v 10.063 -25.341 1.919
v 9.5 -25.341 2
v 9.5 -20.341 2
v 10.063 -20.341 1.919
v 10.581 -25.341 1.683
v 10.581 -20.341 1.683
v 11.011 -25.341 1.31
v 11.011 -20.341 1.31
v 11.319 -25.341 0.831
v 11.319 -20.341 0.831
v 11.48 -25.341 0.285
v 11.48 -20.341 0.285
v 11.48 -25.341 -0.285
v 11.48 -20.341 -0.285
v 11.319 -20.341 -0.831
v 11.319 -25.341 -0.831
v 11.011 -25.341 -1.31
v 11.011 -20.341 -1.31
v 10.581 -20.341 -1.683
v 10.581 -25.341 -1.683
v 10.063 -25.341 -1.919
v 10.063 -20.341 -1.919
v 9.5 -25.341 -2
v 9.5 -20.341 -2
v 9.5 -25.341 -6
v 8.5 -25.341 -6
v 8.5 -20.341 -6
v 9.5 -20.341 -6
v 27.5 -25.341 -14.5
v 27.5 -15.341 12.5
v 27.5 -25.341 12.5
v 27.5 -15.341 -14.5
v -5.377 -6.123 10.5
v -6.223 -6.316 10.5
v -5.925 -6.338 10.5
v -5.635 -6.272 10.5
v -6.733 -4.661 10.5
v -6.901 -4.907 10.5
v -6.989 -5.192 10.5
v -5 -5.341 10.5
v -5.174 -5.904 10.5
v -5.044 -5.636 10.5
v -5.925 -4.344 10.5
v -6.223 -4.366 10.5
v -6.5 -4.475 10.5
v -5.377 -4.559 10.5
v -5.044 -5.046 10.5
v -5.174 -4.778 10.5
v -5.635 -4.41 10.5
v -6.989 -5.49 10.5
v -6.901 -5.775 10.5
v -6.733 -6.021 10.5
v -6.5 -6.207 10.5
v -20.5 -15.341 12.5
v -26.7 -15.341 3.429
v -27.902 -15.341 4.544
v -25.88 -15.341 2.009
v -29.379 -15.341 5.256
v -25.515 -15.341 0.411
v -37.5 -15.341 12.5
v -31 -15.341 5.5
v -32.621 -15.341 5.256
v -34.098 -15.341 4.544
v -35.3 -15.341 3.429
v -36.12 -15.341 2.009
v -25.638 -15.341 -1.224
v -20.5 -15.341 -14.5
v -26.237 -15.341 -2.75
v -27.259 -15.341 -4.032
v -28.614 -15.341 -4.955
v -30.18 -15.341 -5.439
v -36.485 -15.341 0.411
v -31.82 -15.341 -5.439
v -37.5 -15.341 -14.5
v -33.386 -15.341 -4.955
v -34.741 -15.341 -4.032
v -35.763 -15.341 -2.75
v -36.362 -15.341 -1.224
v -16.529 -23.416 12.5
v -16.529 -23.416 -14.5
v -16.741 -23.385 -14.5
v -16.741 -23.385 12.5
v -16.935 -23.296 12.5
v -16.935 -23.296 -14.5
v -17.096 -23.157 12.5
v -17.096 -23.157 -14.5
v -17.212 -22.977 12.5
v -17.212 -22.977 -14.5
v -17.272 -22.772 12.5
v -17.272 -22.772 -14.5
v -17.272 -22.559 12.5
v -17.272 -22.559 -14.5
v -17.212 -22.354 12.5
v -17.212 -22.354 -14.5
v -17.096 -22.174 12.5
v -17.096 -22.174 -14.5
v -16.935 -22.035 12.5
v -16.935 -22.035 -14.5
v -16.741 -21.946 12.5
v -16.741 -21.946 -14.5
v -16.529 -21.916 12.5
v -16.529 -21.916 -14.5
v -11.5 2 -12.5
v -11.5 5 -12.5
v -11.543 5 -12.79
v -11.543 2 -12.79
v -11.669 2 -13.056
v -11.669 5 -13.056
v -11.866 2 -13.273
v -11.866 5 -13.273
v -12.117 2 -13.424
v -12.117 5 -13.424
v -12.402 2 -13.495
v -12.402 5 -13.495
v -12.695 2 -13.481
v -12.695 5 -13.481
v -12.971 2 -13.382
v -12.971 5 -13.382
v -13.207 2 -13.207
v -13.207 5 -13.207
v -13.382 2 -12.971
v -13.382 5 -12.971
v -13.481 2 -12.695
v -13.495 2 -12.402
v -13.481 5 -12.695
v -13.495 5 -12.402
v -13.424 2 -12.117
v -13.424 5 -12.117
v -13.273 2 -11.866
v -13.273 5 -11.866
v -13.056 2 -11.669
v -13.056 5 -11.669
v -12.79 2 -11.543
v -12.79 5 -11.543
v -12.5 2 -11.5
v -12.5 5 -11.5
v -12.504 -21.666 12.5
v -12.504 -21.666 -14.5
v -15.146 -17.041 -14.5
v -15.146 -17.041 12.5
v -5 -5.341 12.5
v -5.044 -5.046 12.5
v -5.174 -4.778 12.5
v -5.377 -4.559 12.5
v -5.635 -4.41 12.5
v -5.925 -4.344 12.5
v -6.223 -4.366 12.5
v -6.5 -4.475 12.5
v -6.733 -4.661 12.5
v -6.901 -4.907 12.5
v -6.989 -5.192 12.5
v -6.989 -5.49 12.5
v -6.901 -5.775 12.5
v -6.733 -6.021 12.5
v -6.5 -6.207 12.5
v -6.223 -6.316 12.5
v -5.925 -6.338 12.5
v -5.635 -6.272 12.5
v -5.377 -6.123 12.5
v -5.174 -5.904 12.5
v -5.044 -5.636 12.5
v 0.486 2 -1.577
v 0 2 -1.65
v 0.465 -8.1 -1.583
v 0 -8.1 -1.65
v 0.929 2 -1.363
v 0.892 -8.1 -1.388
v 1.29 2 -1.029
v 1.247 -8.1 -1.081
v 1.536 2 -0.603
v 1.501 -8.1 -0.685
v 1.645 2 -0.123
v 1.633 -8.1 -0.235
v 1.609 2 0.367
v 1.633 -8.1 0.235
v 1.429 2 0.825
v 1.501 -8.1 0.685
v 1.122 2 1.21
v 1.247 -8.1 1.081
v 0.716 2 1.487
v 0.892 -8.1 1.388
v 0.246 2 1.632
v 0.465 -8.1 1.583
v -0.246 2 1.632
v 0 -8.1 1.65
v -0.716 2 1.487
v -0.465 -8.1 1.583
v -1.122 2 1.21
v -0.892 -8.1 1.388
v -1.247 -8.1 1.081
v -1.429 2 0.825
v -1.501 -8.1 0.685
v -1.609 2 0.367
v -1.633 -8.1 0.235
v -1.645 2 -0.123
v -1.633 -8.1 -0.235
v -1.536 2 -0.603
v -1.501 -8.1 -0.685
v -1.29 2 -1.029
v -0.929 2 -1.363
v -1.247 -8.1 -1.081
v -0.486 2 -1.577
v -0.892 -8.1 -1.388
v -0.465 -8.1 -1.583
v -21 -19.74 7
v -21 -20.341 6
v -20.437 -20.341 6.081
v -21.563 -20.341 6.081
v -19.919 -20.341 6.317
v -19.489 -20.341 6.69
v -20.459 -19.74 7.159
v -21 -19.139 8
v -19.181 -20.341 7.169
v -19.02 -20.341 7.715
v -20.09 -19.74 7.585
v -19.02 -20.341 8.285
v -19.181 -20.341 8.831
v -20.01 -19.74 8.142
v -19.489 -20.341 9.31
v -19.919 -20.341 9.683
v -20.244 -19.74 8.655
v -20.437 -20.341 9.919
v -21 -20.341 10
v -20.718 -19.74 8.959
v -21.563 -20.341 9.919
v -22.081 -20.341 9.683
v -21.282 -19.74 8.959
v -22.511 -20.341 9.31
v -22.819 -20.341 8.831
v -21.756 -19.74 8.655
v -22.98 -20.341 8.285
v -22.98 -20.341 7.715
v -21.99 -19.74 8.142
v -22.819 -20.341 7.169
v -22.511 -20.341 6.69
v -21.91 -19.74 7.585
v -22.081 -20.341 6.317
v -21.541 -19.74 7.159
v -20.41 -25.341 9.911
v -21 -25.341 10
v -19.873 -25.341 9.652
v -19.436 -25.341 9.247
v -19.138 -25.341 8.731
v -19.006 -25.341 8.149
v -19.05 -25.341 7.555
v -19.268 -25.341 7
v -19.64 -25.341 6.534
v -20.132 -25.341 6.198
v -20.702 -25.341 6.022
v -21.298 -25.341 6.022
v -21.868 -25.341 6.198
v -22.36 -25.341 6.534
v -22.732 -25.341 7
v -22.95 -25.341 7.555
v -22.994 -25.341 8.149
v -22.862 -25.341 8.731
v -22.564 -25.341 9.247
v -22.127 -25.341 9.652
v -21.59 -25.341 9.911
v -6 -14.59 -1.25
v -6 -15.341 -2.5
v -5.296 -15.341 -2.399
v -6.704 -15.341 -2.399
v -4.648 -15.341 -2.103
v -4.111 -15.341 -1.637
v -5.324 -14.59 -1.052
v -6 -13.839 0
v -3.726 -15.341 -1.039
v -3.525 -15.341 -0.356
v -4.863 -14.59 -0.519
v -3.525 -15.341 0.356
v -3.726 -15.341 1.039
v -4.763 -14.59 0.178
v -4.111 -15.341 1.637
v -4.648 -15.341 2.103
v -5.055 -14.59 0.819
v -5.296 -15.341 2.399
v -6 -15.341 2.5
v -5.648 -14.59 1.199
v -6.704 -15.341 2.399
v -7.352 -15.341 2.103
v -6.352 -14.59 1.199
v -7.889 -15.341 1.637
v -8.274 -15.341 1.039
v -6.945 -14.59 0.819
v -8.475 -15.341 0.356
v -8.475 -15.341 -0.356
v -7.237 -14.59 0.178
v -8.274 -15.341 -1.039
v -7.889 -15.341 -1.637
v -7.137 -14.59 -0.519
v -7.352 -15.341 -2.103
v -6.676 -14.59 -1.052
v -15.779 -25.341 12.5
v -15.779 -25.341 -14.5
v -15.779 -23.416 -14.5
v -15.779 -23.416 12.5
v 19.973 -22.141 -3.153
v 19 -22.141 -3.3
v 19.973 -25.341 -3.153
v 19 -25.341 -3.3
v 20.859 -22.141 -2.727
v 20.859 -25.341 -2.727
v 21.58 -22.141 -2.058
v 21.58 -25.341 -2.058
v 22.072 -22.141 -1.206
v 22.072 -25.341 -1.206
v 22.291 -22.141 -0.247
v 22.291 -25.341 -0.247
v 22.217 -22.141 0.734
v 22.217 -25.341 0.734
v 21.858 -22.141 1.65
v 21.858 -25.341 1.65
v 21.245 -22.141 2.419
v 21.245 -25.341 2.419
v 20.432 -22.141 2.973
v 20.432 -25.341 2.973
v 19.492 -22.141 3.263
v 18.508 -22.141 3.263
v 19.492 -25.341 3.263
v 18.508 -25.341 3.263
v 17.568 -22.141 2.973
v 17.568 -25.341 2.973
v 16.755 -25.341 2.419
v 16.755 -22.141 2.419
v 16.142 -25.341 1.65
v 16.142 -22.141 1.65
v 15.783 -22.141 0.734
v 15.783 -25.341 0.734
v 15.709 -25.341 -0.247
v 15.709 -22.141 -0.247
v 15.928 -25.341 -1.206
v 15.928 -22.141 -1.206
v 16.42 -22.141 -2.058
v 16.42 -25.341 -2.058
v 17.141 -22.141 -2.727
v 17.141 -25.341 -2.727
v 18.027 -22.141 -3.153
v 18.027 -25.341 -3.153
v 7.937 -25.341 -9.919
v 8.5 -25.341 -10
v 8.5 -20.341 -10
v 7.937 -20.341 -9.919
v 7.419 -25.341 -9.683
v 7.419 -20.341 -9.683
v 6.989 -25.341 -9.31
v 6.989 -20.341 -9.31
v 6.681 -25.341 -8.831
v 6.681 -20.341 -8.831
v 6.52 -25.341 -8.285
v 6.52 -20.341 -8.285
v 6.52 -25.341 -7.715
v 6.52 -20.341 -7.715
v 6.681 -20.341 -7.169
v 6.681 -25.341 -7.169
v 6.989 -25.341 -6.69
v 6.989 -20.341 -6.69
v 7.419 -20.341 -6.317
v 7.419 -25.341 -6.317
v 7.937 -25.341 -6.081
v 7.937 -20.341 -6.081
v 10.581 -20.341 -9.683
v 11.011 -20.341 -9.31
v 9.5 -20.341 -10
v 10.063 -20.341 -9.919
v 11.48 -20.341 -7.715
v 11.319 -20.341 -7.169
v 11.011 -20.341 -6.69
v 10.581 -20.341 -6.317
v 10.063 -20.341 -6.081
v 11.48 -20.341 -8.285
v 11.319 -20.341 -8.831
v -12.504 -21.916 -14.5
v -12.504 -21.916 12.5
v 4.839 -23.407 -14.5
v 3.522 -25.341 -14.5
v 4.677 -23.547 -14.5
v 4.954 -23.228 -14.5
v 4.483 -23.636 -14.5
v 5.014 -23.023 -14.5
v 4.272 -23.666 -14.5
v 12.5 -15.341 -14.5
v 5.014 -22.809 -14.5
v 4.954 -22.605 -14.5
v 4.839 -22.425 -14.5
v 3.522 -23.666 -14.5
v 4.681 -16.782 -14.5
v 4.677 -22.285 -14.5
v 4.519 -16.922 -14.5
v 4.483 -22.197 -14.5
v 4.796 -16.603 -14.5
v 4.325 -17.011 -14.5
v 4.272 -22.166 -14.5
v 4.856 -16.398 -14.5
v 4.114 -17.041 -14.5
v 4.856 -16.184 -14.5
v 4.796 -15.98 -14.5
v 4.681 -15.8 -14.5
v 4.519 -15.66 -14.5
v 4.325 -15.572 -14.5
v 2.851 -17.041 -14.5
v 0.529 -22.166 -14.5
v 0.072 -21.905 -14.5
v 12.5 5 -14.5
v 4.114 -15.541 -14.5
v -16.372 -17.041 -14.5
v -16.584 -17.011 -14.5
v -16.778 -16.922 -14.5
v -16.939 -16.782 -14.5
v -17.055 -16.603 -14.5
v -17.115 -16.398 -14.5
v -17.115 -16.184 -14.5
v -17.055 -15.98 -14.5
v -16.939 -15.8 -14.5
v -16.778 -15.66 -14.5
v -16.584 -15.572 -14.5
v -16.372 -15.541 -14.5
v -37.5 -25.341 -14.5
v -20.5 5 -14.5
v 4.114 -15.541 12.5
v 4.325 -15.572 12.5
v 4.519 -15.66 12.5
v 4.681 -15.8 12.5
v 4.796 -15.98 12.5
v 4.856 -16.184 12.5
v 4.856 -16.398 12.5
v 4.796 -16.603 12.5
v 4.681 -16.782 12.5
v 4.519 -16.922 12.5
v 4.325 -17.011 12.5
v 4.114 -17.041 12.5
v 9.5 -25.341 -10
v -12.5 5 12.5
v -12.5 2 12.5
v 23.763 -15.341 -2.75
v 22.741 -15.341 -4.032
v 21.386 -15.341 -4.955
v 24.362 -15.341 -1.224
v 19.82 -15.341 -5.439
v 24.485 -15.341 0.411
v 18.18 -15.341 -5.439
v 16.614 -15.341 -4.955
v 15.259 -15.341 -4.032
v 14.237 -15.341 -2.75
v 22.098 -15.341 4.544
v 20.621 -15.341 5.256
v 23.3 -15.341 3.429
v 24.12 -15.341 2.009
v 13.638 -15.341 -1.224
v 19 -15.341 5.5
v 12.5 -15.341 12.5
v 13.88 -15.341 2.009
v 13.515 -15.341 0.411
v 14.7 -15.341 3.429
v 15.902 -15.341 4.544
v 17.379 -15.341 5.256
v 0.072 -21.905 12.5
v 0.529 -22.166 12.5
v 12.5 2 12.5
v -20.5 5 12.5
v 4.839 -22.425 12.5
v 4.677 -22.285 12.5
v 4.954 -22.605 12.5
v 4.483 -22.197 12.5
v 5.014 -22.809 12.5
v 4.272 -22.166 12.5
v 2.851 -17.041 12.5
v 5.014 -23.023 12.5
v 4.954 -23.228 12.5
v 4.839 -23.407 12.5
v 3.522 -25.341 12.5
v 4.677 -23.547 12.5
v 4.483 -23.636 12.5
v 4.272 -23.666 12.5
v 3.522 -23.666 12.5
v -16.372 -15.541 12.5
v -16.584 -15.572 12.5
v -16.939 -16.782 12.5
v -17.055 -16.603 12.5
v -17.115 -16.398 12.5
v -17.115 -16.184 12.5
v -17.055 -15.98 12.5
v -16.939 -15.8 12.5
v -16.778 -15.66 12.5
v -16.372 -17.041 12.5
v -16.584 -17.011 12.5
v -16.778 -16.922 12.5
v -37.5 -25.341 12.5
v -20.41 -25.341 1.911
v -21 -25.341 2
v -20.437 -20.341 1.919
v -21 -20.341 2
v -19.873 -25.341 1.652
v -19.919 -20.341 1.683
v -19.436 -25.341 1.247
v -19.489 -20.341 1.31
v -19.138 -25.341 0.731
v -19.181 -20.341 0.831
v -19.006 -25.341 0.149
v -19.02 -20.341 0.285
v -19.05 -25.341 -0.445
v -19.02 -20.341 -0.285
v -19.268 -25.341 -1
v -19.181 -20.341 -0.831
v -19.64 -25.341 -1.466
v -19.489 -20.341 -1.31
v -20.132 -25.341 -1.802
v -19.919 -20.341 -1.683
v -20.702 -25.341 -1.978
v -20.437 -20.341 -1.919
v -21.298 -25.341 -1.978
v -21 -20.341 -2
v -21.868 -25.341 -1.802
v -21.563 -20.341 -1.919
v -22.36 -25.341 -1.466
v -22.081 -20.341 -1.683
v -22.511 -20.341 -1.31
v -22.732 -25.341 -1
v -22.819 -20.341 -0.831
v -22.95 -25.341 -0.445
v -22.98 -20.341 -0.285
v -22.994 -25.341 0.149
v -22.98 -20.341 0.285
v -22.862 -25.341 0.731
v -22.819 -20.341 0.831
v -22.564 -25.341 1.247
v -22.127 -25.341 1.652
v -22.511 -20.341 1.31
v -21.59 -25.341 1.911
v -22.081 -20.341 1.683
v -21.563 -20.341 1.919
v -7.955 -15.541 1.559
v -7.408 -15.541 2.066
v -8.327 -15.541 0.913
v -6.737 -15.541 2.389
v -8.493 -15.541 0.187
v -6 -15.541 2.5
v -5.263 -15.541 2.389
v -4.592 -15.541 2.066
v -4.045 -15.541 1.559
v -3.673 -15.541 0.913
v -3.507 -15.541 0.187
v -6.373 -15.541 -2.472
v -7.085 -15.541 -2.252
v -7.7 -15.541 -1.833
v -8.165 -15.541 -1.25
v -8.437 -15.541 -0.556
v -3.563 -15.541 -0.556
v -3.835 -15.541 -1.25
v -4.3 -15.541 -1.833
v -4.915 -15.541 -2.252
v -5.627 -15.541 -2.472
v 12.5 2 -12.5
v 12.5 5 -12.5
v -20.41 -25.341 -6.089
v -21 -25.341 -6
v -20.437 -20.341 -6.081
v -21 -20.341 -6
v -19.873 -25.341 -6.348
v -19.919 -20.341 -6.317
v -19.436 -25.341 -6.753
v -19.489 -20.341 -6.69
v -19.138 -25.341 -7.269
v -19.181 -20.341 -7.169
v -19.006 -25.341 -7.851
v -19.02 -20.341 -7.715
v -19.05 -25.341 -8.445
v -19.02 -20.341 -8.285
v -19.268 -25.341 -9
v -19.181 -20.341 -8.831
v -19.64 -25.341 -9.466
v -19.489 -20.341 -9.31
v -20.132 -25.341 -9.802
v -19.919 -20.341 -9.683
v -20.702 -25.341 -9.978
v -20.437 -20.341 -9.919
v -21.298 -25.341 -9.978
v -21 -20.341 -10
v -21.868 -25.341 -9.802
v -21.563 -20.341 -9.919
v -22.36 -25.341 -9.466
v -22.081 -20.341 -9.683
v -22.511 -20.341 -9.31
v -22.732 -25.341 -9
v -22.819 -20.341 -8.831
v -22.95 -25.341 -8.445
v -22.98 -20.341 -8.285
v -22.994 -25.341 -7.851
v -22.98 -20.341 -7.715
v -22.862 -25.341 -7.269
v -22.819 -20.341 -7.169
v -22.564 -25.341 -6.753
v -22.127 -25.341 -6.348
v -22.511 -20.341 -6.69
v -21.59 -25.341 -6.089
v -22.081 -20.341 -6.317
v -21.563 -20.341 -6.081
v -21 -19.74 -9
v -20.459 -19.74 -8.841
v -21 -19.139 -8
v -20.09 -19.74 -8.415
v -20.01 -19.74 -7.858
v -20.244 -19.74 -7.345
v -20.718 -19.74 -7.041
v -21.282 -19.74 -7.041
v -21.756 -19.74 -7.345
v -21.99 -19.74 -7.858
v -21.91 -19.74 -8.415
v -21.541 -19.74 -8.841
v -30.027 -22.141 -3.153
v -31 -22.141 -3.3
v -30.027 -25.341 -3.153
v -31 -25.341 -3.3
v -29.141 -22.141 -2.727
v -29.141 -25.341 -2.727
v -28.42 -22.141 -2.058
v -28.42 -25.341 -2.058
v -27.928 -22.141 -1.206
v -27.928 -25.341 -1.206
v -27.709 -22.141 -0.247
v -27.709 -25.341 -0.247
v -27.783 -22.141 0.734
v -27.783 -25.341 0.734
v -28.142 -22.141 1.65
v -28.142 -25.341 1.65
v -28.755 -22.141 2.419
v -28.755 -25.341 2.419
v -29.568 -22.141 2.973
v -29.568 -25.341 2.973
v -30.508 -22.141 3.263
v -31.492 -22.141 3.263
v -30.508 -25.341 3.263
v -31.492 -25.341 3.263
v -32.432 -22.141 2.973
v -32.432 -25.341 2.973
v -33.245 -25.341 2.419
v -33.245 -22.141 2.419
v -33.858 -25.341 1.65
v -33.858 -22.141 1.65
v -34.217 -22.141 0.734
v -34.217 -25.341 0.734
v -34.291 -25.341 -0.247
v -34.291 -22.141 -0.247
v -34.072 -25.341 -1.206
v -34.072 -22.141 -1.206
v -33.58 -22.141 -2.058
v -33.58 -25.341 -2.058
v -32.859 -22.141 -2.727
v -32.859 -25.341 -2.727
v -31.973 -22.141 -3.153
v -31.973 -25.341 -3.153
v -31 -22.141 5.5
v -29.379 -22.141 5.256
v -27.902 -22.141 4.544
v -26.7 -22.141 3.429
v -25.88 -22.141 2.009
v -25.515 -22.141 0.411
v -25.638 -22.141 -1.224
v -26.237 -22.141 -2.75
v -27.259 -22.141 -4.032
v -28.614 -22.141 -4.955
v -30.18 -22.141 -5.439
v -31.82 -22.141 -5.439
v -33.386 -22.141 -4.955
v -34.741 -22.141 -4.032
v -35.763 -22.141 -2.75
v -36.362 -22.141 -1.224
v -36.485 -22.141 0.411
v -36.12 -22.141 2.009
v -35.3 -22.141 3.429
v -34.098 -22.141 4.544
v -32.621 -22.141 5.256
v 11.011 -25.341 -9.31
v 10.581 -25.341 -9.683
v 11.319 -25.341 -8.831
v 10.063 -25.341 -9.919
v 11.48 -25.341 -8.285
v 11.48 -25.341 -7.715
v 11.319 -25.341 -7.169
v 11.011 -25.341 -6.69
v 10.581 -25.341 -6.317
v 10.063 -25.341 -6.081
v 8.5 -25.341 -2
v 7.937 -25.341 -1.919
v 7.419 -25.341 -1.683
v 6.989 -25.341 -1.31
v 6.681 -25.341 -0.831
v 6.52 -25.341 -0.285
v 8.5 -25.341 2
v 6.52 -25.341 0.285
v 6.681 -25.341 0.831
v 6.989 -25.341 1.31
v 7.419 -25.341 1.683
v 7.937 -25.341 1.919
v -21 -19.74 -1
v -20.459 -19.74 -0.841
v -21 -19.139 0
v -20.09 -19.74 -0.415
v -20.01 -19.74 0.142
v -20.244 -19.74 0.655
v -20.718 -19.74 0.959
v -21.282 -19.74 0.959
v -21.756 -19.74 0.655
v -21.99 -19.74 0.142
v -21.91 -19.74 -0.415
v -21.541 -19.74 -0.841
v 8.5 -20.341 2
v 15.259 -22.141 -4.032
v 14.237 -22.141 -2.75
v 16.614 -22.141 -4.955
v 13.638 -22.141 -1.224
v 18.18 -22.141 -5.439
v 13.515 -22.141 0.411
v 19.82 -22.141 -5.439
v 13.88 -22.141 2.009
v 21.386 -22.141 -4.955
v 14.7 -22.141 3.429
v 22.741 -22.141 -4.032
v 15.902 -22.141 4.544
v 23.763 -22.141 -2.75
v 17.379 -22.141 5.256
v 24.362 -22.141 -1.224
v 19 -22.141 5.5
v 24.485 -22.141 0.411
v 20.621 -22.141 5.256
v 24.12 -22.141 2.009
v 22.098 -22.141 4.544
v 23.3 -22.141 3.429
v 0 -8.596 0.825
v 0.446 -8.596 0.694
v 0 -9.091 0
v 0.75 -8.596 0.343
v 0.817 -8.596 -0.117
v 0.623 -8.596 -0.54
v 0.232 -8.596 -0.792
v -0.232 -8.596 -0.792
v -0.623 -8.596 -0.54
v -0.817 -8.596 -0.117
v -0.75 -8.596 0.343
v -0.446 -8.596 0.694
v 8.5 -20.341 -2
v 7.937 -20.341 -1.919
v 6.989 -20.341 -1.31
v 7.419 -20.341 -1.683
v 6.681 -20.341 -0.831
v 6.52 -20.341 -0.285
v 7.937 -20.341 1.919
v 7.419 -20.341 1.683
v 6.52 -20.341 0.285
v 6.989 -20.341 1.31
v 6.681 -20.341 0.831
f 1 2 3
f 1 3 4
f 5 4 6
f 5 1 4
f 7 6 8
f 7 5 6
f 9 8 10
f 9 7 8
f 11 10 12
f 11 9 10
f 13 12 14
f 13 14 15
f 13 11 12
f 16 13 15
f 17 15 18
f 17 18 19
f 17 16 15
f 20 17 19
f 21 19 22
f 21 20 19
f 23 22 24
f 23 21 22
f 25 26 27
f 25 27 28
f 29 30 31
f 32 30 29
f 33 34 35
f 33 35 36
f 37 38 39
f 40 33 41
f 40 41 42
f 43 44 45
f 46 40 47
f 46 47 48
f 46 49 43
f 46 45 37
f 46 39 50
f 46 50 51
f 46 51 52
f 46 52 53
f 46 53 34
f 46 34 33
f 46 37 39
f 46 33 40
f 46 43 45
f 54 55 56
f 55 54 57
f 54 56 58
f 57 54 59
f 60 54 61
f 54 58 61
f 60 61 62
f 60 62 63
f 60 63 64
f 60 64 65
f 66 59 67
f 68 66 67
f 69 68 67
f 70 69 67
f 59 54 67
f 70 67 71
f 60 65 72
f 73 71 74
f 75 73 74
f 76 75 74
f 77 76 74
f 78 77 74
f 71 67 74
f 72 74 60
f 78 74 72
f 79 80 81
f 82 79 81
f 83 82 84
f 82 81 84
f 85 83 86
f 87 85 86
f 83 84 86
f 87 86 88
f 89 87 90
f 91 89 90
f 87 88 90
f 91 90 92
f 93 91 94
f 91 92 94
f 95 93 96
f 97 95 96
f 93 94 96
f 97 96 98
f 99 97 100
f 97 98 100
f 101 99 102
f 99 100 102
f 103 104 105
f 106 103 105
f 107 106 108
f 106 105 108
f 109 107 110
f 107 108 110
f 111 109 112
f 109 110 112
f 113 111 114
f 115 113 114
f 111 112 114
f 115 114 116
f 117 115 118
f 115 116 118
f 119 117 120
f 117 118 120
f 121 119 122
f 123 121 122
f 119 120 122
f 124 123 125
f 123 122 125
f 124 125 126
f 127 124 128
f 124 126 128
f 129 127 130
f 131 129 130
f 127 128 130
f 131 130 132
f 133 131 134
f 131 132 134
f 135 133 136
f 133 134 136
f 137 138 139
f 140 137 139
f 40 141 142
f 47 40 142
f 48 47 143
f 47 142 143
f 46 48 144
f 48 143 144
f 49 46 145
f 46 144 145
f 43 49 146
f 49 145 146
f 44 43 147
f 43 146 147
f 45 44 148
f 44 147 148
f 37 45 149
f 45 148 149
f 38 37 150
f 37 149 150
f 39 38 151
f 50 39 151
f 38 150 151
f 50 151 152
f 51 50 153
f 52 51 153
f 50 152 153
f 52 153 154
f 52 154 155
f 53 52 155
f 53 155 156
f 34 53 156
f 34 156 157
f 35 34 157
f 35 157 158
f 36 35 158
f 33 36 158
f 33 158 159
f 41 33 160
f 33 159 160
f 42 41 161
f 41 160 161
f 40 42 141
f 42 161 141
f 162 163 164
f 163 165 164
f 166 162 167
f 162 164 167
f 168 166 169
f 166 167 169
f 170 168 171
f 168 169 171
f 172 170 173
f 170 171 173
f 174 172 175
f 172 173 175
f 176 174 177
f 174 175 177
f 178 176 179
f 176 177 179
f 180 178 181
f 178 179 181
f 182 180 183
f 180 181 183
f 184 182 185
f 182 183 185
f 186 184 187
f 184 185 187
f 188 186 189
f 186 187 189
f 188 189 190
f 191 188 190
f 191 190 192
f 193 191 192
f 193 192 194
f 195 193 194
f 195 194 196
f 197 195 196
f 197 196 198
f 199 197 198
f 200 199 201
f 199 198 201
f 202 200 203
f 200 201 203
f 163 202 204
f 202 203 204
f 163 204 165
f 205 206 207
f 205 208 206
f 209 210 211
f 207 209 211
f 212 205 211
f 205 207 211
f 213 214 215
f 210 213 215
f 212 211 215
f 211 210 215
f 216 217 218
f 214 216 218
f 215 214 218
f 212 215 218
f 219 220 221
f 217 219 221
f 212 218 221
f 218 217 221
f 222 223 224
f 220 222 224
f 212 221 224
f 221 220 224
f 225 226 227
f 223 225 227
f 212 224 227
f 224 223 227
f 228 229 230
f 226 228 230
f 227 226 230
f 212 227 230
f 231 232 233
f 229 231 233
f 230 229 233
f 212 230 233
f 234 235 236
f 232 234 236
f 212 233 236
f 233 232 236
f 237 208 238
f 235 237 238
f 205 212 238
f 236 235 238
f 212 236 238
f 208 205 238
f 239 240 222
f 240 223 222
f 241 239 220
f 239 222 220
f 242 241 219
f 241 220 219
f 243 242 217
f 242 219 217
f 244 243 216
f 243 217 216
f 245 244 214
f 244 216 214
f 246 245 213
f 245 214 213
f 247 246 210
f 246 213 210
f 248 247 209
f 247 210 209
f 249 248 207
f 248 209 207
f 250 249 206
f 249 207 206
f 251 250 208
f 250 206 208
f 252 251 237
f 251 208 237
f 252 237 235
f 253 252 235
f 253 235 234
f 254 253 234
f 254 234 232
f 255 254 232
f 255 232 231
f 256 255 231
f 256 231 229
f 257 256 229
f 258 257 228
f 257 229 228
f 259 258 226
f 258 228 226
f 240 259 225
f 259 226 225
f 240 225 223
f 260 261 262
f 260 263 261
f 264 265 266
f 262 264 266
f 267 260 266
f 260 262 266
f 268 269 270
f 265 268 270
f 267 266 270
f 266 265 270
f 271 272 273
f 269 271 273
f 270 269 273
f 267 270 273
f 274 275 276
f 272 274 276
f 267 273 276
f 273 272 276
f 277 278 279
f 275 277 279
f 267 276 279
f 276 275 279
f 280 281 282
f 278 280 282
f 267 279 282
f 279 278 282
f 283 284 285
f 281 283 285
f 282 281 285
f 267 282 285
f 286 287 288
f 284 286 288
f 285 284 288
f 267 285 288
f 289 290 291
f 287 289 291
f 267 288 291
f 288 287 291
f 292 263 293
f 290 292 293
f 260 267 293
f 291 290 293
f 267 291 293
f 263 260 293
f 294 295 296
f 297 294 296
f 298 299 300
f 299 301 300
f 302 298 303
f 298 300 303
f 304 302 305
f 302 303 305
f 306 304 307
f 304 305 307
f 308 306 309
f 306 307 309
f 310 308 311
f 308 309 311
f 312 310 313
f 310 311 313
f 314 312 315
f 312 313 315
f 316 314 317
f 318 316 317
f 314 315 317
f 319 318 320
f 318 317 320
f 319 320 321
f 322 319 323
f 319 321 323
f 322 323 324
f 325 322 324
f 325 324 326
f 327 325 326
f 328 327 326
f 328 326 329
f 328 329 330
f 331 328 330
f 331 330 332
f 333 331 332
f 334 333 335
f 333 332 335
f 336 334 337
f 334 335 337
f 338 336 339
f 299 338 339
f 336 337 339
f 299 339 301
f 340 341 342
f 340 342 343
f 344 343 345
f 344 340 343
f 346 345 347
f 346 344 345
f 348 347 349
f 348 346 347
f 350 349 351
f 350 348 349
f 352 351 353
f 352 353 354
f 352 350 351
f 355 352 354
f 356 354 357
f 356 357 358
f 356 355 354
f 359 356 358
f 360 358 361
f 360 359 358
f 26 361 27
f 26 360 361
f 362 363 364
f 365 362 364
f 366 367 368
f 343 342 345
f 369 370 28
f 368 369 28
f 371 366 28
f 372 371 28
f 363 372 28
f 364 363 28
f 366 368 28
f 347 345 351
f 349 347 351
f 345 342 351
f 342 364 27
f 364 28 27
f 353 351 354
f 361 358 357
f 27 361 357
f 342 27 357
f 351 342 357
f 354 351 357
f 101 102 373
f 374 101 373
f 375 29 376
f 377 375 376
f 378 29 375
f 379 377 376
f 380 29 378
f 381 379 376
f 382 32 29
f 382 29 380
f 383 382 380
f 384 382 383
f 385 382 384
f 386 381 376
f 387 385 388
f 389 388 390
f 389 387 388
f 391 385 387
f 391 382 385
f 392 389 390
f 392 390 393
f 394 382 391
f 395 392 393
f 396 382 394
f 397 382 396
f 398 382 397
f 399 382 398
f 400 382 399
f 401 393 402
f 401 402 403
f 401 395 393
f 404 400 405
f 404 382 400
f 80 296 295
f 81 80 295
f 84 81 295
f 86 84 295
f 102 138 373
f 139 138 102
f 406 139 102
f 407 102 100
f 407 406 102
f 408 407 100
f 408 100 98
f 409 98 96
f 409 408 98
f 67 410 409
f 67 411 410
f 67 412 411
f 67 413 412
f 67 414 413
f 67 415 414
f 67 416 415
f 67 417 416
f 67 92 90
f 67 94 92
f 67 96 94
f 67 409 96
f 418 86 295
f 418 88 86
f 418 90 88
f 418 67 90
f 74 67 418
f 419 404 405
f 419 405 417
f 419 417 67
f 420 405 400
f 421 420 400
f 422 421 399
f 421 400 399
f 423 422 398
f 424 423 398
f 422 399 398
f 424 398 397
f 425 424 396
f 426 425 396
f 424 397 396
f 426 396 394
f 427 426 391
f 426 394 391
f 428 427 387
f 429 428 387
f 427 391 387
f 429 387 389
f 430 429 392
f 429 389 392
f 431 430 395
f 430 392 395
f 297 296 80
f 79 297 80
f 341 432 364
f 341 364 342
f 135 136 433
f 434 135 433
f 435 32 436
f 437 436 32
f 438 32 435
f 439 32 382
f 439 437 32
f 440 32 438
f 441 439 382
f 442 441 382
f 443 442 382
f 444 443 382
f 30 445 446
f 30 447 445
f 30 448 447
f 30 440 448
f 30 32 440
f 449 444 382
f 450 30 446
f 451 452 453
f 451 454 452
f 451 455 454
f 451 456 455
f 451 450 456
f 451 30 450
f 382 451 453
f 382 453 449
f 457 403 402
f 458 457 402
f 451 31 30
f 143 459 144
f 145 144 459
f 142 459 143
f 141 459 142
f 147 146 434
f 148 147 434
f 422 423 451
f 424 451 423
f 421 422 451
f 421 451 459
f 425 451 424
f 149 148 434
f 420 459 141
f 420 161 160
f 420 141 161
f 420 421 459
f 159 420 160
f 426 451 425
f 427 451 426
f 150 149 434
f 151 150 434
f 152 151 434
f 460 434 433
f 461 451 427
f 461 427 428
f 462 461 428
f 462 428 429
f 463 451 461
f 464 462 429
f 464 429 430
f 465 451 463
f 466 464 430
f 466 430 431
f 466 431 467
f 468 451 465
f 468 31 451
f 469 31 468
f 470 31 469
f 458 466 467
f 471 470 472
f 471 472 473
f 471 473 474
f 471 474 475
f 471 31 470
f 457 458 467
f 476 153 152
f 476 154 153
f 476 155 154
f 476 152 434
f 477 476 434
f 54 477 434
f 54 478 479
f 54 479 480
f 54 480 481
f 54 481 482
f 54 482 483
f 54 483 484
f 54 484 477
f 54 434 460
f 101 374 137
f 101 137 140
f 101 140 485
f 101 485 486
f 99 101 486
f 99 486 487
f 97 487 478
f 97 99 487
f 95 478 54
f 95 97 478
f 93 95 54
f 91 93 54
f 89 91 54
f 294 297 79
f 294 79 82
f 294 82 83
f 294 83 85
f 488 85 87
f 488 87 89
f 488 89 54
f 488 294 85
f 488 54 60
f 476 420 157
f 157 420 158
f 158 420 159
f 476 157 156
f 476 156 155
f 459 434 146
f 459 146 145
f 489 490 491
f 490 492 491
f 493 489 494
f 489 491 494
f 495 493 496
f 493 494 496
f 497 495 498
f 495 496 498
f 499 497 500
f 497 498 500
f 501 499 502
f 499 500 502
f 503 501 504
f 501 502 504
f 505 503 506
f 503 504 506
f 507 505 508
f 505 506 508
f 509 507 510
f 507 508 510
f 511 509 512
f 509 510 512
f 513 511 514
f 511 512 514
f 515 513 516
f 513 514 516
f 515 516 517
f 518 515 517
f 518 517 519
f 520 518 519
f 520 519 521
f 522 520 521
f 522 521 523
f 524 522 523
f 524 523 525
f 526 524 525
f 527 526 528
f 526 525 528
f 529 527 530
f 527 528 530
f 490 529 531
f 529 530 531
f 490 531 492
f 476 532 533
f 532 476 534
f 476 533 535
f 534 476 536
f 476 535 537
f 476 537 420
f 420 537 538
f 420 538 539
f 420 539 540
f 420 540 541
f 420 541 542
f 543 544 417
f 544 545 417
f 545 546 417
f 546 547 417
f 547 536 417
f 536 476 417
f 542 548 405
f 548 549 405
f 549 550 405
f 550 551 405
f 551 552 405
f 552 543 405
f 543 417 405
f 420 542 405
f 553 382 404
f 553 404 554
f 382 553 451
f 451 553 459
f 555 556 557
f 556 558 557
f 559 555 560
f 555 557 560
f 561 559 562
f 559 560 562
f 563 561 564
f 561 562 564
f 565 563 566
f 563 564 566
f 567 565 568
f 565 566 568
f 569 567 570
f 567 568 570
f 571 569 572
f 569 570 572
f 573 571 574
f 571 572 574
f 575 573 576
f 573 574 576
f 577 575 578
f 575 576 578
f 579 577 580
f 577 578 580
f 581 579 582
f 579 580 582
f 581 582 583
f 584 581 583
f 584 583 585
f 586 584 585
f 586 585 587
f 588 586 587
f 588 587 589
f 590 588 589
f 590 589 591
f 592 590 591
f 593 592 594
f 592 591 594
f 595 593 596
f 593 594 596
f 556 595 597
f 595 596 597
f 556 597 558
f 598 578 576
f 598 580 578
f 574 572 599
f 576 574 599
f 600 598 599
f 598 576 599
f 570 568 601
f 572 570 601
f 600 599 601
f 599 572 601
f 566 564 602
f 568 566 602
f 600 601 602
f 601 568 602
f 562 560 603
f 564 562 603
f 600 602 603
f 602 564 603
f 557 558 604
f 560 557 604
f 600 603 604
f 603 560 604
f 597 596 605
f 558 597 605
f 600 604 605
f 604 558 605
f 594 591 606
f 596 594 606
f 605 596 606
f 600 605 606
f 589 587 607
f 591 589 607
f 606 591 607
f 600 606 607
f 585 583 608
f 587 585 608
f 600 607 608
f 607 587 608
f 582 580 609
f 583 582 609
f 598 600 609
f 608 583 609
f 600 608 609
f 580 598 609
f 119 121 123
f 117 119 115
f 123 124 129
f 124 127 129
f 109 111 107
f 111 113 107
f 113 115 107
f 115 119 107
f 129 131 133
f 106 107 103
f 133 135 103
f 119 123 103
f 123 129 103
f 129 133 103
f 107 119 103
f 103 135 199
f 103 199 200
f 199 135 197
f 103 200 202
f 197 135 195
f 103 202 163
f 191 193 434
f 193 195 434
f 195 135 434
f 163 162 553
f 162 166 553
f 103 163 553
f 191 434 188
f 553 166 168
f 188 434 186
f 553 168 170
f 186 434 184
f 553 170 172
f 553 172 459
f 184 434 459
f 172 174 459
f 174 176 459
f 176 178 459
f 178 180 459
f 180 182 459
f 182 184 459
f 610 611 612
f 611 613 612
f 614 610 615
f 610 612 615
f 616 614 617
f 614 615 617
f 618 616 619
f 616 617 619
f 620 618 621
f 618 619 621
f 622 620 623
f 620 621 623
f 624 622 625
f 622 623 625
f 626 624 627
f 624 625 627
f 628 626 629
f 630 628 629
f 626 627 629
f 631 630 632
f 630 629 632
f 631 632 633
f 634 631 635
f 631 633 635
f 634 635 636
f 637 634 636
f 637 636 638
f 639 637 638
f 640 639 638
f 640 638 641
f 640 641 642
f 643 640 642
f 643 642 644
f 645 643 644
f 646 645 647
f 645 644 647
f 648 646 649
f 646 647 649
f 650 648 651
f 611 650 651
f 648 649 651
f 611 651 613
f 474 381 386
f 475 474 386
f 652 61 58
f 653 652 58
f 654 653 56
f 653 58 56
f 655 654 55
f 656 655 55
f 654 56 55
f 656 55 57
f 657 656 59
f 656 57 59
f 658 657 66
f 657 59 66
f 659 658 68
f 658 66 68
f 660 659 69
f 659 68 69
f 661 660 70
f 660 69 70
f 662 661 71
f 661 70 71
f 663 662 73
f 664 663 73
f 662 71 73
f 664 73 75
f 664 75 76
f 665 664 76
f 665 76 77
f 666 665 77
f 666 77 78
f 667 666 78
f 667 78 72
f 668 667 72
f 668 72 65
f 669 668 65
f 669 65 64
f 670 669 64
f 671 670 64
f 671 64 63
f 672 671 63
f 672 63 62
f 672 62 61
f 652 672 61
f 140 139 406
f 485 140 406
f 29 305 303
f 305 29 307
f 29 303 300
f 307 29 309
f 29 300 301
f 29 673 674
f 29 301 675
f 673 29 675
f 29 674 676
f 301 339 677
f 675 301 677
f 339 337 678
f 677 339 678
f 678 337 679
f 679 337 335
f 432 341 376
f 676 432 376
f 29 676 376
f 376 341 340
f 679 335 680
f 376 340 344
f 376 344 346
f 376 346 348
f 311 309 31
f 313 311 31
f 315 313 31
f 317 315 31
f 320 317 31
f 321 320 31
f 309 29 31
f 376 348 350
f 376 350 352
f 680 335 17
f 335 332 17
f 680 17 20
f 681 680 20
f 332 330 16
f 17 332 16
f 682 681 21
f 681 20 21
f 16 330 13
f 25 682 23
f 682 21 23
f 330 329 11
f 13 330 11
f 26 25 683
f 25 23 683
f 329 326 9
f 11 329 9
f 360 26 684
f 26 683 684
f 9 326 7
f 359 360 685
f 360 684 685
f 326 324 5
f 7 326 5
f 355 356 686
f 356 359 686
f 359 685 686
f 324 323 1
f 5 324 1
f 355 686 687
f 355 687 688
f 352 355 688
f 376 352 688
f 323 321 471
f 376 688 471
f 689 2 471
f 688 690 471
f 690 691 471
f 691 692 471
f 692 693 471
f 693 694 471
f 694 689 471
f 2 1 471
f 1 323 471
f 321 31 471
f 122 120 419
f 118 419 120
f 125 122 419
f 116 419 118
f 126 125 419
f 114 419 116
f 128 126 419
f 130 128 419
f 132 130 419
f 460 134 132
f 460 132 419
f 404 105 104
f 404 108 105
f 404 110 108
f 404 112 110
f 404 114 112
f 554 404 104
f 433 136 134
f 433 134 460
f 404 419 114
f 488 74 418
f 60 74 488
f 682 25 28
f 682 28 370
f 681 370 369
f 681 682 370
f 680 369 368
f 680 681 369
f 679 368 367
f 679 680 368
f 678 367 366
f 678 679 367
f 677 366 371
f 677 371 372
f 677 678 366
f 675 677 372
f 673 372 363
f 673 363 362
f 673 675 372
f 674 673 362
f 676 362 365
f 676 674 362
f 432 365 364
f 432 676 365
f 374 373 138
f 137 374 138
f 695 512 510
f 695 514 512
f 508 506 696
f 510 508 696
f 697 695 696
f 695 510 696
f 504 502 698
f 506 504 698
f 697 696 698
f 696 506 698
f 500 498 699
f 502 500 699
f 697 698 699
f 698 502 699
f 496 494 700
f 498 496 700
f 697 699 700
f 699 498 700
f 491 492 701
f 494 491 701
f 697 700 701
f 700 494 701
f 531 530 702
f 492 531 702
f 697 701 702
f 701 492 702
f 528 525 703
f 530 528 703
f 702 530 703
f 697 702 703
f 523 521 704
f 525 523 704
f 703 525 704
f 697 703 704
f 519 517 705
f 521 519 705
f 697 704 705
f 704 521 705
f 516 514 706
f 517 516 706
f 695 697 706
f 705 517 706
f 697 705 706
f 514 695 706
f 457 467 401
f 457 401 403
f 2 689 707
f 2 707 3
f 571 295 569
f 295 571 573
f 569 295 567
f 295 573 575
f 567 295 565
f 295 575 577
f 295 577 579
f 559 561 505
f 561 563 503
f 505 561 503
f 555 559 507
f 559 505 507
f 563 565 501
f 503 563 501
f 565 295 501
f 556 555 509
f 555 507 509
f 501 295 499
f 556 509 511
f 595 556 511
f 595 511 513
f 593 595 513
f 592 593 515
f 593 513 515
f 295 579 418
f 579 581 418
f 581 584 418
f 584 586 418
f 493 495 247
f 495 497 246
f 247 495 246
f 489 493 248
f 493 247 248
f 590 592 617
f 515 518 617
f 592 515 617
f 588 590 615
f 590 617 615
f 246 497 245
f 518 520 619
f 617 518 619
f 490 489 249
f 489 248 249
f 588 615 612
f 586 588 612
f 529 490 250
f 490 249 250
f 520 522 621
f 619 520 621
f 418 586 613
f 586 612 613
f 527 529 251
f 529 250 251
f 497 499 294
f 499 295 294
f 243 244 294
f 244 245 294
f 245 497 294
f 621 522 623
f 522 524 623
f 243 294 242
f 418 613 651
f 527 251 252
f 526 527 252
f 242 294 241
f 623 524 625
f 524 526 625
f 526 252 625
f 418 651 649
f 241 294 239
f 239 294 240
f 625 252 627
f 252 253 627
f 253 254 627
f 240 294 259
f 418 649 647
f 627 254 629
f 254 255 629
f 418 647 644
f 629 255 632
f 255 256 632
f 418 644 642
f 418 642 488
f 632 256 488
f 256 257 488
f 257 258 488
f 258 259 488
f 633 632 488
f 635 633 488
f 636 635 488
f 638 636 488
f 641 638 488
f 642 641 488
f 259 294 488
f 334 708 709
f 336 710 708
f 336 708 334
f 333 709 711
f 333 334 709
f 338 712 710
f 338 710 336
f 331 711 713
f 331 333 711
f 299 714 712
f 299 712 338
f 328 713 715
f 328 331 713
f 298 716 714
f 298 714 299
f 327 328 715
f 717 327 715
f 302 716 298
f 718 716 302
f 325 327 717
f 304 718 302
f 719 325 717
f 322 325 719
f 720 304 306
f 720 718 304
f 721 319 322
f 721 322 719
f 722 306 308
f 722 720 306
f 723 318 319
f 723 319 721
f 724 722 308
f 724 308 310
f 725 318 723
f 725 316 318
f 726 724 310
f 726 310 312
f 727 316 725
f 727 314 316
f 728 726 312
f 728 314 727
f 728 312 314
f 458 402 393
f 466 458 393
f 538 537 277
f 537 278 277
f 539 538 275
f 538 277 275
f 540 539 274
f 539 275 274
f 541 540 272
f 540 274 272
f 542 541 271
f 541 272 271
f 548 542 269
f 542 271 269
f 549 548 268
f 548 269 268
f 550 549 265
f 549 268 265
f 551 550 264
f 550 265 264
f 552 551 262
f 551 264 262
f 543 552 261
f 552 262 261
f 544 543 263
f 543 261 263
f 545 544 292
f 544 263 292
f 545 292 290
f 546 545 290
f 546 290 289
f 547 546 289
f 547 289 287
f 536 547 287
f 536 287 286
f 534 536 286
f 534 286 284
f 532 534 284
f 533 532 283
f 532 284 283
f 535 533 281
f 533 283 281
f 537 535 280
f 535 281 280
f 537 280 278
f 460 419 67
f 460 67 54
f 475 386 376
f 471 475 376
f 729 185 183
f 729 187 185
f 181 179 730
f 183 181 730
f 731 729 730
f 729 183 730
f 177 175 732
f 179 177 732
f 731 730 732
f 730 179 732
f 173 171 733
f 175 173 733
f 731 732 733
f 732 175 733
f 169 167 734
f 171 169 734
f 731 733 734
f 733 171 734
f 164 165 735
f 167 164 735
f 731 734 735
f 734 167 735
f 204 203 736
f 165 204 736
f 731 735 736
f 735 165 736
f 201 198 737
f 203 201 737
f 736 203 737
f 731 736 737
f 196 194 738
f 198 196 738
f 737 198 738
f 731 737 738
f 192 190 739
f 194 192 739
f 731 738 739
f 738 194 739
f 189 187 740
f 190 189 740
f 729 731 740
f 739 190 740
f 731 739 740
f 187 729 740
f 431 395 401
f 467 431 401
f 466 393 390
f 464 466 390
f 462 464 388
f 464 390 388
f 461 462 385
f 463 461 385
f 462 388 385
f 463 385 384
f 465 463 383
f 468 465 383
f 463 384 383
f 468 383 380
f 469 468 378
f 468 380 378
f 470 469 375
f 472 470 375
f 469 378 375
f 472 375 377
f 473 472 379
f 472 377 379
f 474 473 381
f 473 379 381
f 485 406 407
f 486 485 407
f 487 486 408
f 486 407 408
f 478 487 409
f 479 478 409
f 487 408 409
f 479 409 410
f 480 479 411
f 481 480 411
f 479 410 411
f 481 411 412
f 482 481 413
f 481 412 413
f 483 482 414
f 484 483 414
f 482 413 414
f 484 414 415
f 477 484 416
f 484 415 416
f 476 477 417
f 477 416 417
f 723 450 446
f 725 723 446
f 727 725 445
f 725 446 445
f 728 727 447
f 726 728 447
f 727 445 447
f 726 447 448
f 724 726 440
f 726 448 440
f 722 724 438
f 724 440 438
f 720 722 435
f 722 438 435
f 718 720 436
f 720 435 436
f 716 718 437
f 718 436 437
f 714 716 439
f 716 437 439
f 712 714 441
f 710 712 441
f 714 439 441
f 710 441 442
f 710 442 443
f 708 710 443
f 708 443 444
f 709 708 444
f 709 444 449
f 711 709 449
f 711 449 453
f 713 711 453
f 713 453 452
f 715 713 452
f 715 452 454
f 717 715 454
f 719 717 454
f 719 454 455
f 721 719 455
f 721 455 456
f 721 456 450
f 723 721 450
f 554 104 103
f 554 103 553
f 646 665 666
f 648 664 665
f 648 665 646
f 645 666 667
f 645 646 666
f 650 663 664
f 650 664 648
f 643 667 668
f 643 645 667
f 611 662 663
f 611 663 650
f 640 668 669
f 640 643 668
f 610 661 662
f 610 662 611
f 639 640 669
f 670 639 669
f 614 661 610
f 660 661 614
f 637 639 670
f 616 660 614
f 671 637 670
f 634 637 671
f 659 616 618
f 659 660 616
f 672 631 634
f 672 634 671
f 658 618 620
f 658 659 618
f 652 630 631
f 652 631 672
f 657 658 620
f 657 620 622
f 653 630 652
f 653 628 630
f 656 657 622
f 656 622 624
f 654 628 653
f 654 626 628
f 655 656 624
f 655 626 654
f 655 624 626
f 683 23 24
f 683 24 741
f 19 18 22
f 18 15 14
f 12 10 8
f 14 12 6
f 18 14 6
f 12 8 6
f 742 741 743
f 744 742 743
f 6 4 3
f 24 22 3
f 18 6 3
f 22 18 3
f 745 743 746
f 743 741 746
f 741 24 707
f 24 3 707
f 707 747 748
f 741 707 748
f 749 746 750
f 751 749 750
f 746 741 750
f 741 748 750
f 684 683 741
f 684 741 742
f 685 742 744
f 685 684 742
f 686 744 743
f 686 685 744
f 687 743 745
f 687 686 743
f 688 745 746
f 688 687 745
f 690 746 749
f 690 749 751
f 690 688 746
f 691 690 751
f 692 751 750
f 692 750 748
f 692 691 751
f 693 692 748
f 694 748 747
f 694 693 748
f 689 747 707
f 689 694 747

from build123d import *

# Parameters (mm, degrees)
SKETCH_1_W                = 29
SKETCH_1_H                = 29
EXTRUDE_1_DEPTH           = 5
SKETCH_2_W                = 25
SKETCH_2_H                = 25
CUT_EXTRUDE_1_DEPTH       = 3
SKETCH_3_W                = 35
SKETCH_3_H                = 29
EXTRUDE_756_DEPTH         = 25.341167732
HOLE_WIZARD_M4_1_D        = 3.3
HOLE_WIZARD_M4_1_DEPTH    = 10.1
HOLE_WIZARD_M4_1_TIP      = 0.991420021
SKETCH_9_R                = 1
CUT_EXTRUDE_2_DEPTH       = 3
SKETCH_11_W               = 29
SKETCH_11_H               = 5
EXTRUDE_4_DEPTH           = 6
CUT_EXTRUDE_8_DEPTH       = 40.383835
SKETCH_19_W               = 80
SKETCH_19_H               = 25
EXTRUDE_5_DEPTH           = 10
HOLE_WIZARD_1_D           = 6.6
HOLE_WIZARD_1_DEPTH       = 10.1
HOLE_WIZARD_1_CBORE_D     = 11
HOLE_WIZARD_1_CBORE_DEPTH = 6.8
HOLE_WIZARD_1_TIP         = 1.982840043
SKETCH_23_W               = 80
SKETCH_23_H               = 10
EXTRUDE_6_DEPTH           = 2
SKETCH_24_W               = 27
SKETCH_24_H               = 10
CUT_EXTRUDE_9_DEPTH       = 2
MM_1_D                    = 4
MM_1_DEPTH                = 5
MM_1_TIP                  = 1.201721238
CUT_EXTRUDE_10_DEPTH      = 5
SKETCH_28_R               = 1
CUT_EXTRUDE_11_DEPTH      = 2
HOLE_WIZARD_M6_1_D        = 5
HOLE_WIZARD_M6_1_DEPTH    = 10
HOLE_WIZARD_M6_1_TIP      = 1.502151548
CUT_EXTRUDE_12_DEPTH      = 62.837260656
CUT_EXTRUDE_12_DEPTH_BACK = 62.837260656
SKETCH_32_W               = 27
SKETCH_32_H               = 10
CUT_EXTRUDE_13_DEPTH      = 6.5
SKETCH_33_W               = 27
SKETCH_33_H               = 10
CUT_EXTRUDE_14_DEPTH      = 6.5
CUT_EXTRUDE_15_DEPTH      = 5
MM_2_D                    = 4
MM_2_DEPTH                = 5
MM_2_TIP                  = 1.201721238
MM_3_D                    = 4
MM_3_DEPTH                = 5
MM_3_TIP                  = 1.201721238


with BuildPart() as part:
    # 草图1 → 凸台-拉伸1 (new body)
    with BuildSketch(Plane(origin=(0, 0, 0), x_dir=(1, 0, 0), z_dir=(0, 1, 0))):
        Rectangle(SKETCH_1_W, SKETCH_1_H)
    extrude(amount=EXTRUDE_1_DEPTH)

    # 草图2 → 切除-拉伸1 (cut)
    with BuildSketch(Plane.XZ.offset(-5)):
        Rectangle(SKETCH_2_W, SKETCH_2_H)
    extrude(amount=CUT_EXTRUDE_1_DEPTH, mode=Mode.SUBTRACT)

    # 草图3 → Extrude 756 (add)
    with BuildSketch(Plane(origin=(0, 0, 0), x_dir=(-1, 0, 0), z_dir=(0, -1, 0))):
        with Locations((3, 0)):
            Rectangle(SKETCH_3_W, SKETCH_3_H)
    extrude(amount=EXTRUDE_756_DEPTH)

    # M4 螺纹孔1
    with Locations(Plane.ZX.offset(2)):
        with Locations((0, 0)):
            Hole(HOLE_WIZARD_M4_1_D / 2, depth=HOLE_WIZARD_M4_1_DEPTH)
            with Locations((0, 0, -(HOLE_WIZARD_M4_1_DEPTH + HOLE_WIZARD_M4_1_TIP / 2))):  # 118° drill point
                Cone(0, HOLE_WIZARD_M4_1_D / 2, HOLE_WIZARD_M4_1_TIP, mode=Mode.SUBTRACT)

    # 草图9 → 切除-拉伸2 (cut)
    with BuildSketch(Plane(origin=(0, 5, 0), x_dir=(1, 0, 0), z_dir=(0, 1, 0))):
        with Locations((-12.5, 12.5)):
            Circle(SKETCH_9_R)
    extrude(amount=-CUT_EXTRUDE_2_DEPTH, mode=Mode.SUBTRACT)

    # 草图11 → 凸台-拉伸4 (add)
    with BuildSketch(Plane.ZY.offset(14.5)):
        with Locations((0, 2.5)):
            Rectangle(SKETCH_11_W, SKETCH_11_H)
    extrude(amount=EXTRUDE_4_DEPTH)

    # 草图17 → 切除-拉伸8 (cut, through all)
    with BuildSketch(Plane(origin=(0, 5, 0), x_dir=(1, 0, 0), z_dir=(0, 1, 0))):
        Polygon((-20.5, -14.5), (14.5, -14.5), (14.5, 14.5), (12.5, 14.5), (12.5, -12.5), (-20.5, -12.5), align=None)
    extrude(amount=-CUT_EXTRUDE_8_DEPTH, mode=Mode.SUBTRACT)

    # 草图19 → 凸台-拉伸5 (add)
    with BuildSketch(Plane(origin=(0, -25.341167732, 0), x_dir=(-1, 0, 0), z_dir=(0, -1, 0))):
        with Locations((6, 0)):
            Rectangle(SKETCH_19_W, SKETCH_19_H)
    extrude(amount=-EXTRUDE_5_DEPTH)

    # 打孔尺寸(%根据)内六角圆柱头螺钉的类型1
    with Locations(Plane(origin=(-31, -15.341167732, 0), x_dir=(0, 0, 1), z_dir=(0, 1, 0))):
        with Locations((0, 0), (0, 50)):
            CounterBoreHole(HOLE_WIZARD_1_D / 2, HOLE_WIZARD_1_CBORE_D / 2, HOLE_WIZARD_1_CBORE_DEPTH, depth=HOLE_WIZARD_1_DEPTH)
            with Locations((0, 0, -(HOLE_WIZARD_1_DEPTH + HOLE_WIZARD_1_TIP / 2))):  # 118° drill point
                Cone(0, HOLE_WIZARD_1_D / 2, HOLE_WIZARD_1_TIP, mode=Mode.SUBTRACT)

    # 草图23 → 凸台-拉伸6 (add)
    with BuildSketch(Plane(origin=(0, 0, -12.5), x_dir=(-1, 0, 0), z_dir=(0, 0, -1))):
        with Locations((6, -20.341167732)):
            Rectangle(SKETCH_23_W, SKETCH_23_H)
    extrude(amount=EXTRUDE_6_DEPTH)

    # 草图24 → 切除-拉伸9 (cut)
    with BuildSketch(Plane.ZY.offset(46)):
        with Locations((-1, -20.341167732)):
            Rectangle(SKETCH_24_W, SKETCH_24_H)
    extrude(amount=-CUT_EXTRUDE_9_DEPTH, mode=Mode.SUBTRACT)

    # 大小mm 暗销孔1
    with Locations(Plane(origin=(-21, -25.341167732, 0), x_dir=(0, 0, -1), z_dir=(0, -1, 0))):
        with Locations((0, 0)):
            Hole(MM_1_D / 2, depth=MM_1_DEPTH)
            with Locations((0, 0, -(MM_1_DEPTH + MM_1_TIP / 2))):  # 118° drill point
                Cone(0, MM_1_D / 2, MM_1_TIP, mode=Mode.SUBTRACT)

    # 草图27 → 切除-拉伸10 (cut)
    with BuildSketch(Plane.XZ.offset(25.341167732)):
        with BuildLine():
            Line((8.5, 2), (9.5, 2))
            ThreePointArc((9.5, 2), (11.5, 0), (9.5, -2))
            Line((9.5, -2), (8.5, -2))
            ThreePointArc((8.5, -2), (6.5, 0), (8.5, 2))
        make_face()
    extrude(amount=-CUT_EXTRUDE_10_DEPTH, mode=Mode.SUBTRACT)

    # 草图28 → 切除-拉伸11 (cut)
    with BuildSketch(Plane.XY.offset(12.5)):
        with Locations((-6, -5.341167732)):
            Circle(SKETCH_28_R)
    extrude(amount=-CUT_EXTRUDE_11_DEPTH, mode=Mode.SUBTRACT)

    # M6 螺纹孔1
    with Locations(Plane(origin=(-6, -25.341167732, 0), x_dir=(0, 0, -1), z_dir=(0, -1, 0))):
        with Locations((0, 0)):
            Hole(HOLE_WIZARD_M6_1_D / 2, depth=HOLE_WIZARD_M6_1_DEPTH)
            with Locations((0, 0, -(HOLE_WIZARD_M6_1_DEPTH + HOLE_WIZARD_M6_1_TIP / 2))):  # 118° drill point
                Cone(0, HOLE_WIZARD_M6_1_D / 2, HOLE_WIZARD_M6_1_TIP, mode=Mode.SUBTRACT)

    # 草图31 → 切除-拉伸12 (cut, two sides: drawn at the far end of the back side and taken through both)
    with BuildSketch(Plane(origin=(-6.0032, 14.658832268, 10.4718), x_dir=(1, 0, 0), z_dir=(0, 0, 1)).offset(-CUT_EXTRUDE_12_DEPTH_BACK)):
        with BuildLine():
            Line((10.117055245, -31.7), (8.854085532, -31.7))
            Line((8.854085532, -31.7), (6.07517942, -36.564132504))
            Line((6.07517942, -36.564132504), (6.531795149, -36.824999624))
            Line((6.531795149, -36.824999624), (10.275, -36.824999624))
            ThreePointArc((10.275, -36.824999624), (11.025, -37.574999624), (10.275, -38.324999624))
            Line((10.275, -38.324999624), (9.525, -38.324999624))
            Line((9.525, -38.324999624), (9.525, -40))
            Line((9.525, -40), (-9.776101272, -40))
            Line((-9.776101272, -40), (-9.776101272, -38.074384714))
            Line((-9.776101272, -38.074384714), (-10.526101272, -38.074384714))
            ThreePointArc((-10.526101272, -38.074384714), (-11.276101272, -37.324384714), (-10.526101272, -36.574384714))
            Line((-10.526101272, -36.574384714), (-6.501264425, -36.574384714))
            Line((-6.501264425, -36.574384714), (-6.501264425, -36.324384714))
            Line((-6.501264425, -36.324384714), (-9.143201284, -31.7))
            Line((-9.143201284, -31.7), (-10.369175052, -31.7))
            ThreePointArc((-10.369175052, -31.7), (-11.119175052, -30.95), (-10.369175052, -30.2))
            Line((-10.369175052, -30.2), (10.117055245, -30.2))
            ThreePointArc((10.117055245, -30.2), (10.867055245, -30.95), (10.117055245, -31.7))
        make_face()
    extrude(amount=CUT_EXTRUDE_12_DEPTH + CUT_EXTRUDE_12_DEPTH_BACK, mode=Mode.SUBTRACT)

    # 草图32 → 切除-拉伸13 (cut)
    with BuildSketch(Plane.ZY.offset(44)):
        with Locations((-1, -20.341167732)):
            Rectangle(SKETCH_32_W, SKETCH_32_H)
    extrude(amount=-CUT_EXTRUDE_13_DEPTH, mode=Mode.SUBTRACT)

    # 草图33 → 切除-拉伸14 (cut)
    with BuildSketch(Plane(origin=(34, 0, 0), x_dir=(0, 0, -1), z_dir=(1, 0, 0))):
        with Locations((1, -20.341167732)):
            Rectangle(SKETCH_33_W, SKETCH_33_H)
    extrude(amount=-CUT_EXTRUDE_14_DEPTH, mode=Mode.SUBTRACT)

    # 草图35 → 切除-拉伸15 (cut)
    with BuildSketch(Plane.XZ.offset(25.341167732)):
        with BuildLine():
            Line((8.5, -6), (9.5, -6))
            ThreePointArc((9.5, -6), (11.5, -8), (9.5, -10))
            Line((9.5, -10), (8.5, -10))
            ThreePointArc((8.5, -10), (6.5, -8), (8.5, -6))
        make_face()
    extrude(amount=-CUT_EXTRUDE_15_DEPTH, mode=Mode.SUBTRACT)

    # 大小mm 暗销孔2
    with Locations(Plane(origin=(-21, -25.341167732, -8), x_dir=(0, 0, -1), z_dir=(0, -1, 0))):
        with Locations((0, 0)):
            Hole(MM_2_D / 2, depth=MM_2_DEPTH)
            with Locations((0, 0, -(MM_2_DEPTH + MM_2_TIP / 2))):  # 118° drill point
                Cone(0, MM_2_D / 2, MM_2_TIP, mode=Mode.SUBTRACT)

    # 大小mm 暗销孔3
    with Locations(Plane(origin=(-21, -25.341167732, 8), x_dir=(0, 0, -1), z_dir=(0, -1, 0))):
        with Locations((0, 0)):
            Hole(MM_3_D / 2, depth=MM_3_DEPTH)
            with Locations((0, 0, -(MM_3_DEPTH + MM_3_TIP / 2))):  # 118° drill point
                Cone(0, MM_3_D / 2, MM_3_TIP, mode=Mode.SUBTRACT)


solid = part.part
